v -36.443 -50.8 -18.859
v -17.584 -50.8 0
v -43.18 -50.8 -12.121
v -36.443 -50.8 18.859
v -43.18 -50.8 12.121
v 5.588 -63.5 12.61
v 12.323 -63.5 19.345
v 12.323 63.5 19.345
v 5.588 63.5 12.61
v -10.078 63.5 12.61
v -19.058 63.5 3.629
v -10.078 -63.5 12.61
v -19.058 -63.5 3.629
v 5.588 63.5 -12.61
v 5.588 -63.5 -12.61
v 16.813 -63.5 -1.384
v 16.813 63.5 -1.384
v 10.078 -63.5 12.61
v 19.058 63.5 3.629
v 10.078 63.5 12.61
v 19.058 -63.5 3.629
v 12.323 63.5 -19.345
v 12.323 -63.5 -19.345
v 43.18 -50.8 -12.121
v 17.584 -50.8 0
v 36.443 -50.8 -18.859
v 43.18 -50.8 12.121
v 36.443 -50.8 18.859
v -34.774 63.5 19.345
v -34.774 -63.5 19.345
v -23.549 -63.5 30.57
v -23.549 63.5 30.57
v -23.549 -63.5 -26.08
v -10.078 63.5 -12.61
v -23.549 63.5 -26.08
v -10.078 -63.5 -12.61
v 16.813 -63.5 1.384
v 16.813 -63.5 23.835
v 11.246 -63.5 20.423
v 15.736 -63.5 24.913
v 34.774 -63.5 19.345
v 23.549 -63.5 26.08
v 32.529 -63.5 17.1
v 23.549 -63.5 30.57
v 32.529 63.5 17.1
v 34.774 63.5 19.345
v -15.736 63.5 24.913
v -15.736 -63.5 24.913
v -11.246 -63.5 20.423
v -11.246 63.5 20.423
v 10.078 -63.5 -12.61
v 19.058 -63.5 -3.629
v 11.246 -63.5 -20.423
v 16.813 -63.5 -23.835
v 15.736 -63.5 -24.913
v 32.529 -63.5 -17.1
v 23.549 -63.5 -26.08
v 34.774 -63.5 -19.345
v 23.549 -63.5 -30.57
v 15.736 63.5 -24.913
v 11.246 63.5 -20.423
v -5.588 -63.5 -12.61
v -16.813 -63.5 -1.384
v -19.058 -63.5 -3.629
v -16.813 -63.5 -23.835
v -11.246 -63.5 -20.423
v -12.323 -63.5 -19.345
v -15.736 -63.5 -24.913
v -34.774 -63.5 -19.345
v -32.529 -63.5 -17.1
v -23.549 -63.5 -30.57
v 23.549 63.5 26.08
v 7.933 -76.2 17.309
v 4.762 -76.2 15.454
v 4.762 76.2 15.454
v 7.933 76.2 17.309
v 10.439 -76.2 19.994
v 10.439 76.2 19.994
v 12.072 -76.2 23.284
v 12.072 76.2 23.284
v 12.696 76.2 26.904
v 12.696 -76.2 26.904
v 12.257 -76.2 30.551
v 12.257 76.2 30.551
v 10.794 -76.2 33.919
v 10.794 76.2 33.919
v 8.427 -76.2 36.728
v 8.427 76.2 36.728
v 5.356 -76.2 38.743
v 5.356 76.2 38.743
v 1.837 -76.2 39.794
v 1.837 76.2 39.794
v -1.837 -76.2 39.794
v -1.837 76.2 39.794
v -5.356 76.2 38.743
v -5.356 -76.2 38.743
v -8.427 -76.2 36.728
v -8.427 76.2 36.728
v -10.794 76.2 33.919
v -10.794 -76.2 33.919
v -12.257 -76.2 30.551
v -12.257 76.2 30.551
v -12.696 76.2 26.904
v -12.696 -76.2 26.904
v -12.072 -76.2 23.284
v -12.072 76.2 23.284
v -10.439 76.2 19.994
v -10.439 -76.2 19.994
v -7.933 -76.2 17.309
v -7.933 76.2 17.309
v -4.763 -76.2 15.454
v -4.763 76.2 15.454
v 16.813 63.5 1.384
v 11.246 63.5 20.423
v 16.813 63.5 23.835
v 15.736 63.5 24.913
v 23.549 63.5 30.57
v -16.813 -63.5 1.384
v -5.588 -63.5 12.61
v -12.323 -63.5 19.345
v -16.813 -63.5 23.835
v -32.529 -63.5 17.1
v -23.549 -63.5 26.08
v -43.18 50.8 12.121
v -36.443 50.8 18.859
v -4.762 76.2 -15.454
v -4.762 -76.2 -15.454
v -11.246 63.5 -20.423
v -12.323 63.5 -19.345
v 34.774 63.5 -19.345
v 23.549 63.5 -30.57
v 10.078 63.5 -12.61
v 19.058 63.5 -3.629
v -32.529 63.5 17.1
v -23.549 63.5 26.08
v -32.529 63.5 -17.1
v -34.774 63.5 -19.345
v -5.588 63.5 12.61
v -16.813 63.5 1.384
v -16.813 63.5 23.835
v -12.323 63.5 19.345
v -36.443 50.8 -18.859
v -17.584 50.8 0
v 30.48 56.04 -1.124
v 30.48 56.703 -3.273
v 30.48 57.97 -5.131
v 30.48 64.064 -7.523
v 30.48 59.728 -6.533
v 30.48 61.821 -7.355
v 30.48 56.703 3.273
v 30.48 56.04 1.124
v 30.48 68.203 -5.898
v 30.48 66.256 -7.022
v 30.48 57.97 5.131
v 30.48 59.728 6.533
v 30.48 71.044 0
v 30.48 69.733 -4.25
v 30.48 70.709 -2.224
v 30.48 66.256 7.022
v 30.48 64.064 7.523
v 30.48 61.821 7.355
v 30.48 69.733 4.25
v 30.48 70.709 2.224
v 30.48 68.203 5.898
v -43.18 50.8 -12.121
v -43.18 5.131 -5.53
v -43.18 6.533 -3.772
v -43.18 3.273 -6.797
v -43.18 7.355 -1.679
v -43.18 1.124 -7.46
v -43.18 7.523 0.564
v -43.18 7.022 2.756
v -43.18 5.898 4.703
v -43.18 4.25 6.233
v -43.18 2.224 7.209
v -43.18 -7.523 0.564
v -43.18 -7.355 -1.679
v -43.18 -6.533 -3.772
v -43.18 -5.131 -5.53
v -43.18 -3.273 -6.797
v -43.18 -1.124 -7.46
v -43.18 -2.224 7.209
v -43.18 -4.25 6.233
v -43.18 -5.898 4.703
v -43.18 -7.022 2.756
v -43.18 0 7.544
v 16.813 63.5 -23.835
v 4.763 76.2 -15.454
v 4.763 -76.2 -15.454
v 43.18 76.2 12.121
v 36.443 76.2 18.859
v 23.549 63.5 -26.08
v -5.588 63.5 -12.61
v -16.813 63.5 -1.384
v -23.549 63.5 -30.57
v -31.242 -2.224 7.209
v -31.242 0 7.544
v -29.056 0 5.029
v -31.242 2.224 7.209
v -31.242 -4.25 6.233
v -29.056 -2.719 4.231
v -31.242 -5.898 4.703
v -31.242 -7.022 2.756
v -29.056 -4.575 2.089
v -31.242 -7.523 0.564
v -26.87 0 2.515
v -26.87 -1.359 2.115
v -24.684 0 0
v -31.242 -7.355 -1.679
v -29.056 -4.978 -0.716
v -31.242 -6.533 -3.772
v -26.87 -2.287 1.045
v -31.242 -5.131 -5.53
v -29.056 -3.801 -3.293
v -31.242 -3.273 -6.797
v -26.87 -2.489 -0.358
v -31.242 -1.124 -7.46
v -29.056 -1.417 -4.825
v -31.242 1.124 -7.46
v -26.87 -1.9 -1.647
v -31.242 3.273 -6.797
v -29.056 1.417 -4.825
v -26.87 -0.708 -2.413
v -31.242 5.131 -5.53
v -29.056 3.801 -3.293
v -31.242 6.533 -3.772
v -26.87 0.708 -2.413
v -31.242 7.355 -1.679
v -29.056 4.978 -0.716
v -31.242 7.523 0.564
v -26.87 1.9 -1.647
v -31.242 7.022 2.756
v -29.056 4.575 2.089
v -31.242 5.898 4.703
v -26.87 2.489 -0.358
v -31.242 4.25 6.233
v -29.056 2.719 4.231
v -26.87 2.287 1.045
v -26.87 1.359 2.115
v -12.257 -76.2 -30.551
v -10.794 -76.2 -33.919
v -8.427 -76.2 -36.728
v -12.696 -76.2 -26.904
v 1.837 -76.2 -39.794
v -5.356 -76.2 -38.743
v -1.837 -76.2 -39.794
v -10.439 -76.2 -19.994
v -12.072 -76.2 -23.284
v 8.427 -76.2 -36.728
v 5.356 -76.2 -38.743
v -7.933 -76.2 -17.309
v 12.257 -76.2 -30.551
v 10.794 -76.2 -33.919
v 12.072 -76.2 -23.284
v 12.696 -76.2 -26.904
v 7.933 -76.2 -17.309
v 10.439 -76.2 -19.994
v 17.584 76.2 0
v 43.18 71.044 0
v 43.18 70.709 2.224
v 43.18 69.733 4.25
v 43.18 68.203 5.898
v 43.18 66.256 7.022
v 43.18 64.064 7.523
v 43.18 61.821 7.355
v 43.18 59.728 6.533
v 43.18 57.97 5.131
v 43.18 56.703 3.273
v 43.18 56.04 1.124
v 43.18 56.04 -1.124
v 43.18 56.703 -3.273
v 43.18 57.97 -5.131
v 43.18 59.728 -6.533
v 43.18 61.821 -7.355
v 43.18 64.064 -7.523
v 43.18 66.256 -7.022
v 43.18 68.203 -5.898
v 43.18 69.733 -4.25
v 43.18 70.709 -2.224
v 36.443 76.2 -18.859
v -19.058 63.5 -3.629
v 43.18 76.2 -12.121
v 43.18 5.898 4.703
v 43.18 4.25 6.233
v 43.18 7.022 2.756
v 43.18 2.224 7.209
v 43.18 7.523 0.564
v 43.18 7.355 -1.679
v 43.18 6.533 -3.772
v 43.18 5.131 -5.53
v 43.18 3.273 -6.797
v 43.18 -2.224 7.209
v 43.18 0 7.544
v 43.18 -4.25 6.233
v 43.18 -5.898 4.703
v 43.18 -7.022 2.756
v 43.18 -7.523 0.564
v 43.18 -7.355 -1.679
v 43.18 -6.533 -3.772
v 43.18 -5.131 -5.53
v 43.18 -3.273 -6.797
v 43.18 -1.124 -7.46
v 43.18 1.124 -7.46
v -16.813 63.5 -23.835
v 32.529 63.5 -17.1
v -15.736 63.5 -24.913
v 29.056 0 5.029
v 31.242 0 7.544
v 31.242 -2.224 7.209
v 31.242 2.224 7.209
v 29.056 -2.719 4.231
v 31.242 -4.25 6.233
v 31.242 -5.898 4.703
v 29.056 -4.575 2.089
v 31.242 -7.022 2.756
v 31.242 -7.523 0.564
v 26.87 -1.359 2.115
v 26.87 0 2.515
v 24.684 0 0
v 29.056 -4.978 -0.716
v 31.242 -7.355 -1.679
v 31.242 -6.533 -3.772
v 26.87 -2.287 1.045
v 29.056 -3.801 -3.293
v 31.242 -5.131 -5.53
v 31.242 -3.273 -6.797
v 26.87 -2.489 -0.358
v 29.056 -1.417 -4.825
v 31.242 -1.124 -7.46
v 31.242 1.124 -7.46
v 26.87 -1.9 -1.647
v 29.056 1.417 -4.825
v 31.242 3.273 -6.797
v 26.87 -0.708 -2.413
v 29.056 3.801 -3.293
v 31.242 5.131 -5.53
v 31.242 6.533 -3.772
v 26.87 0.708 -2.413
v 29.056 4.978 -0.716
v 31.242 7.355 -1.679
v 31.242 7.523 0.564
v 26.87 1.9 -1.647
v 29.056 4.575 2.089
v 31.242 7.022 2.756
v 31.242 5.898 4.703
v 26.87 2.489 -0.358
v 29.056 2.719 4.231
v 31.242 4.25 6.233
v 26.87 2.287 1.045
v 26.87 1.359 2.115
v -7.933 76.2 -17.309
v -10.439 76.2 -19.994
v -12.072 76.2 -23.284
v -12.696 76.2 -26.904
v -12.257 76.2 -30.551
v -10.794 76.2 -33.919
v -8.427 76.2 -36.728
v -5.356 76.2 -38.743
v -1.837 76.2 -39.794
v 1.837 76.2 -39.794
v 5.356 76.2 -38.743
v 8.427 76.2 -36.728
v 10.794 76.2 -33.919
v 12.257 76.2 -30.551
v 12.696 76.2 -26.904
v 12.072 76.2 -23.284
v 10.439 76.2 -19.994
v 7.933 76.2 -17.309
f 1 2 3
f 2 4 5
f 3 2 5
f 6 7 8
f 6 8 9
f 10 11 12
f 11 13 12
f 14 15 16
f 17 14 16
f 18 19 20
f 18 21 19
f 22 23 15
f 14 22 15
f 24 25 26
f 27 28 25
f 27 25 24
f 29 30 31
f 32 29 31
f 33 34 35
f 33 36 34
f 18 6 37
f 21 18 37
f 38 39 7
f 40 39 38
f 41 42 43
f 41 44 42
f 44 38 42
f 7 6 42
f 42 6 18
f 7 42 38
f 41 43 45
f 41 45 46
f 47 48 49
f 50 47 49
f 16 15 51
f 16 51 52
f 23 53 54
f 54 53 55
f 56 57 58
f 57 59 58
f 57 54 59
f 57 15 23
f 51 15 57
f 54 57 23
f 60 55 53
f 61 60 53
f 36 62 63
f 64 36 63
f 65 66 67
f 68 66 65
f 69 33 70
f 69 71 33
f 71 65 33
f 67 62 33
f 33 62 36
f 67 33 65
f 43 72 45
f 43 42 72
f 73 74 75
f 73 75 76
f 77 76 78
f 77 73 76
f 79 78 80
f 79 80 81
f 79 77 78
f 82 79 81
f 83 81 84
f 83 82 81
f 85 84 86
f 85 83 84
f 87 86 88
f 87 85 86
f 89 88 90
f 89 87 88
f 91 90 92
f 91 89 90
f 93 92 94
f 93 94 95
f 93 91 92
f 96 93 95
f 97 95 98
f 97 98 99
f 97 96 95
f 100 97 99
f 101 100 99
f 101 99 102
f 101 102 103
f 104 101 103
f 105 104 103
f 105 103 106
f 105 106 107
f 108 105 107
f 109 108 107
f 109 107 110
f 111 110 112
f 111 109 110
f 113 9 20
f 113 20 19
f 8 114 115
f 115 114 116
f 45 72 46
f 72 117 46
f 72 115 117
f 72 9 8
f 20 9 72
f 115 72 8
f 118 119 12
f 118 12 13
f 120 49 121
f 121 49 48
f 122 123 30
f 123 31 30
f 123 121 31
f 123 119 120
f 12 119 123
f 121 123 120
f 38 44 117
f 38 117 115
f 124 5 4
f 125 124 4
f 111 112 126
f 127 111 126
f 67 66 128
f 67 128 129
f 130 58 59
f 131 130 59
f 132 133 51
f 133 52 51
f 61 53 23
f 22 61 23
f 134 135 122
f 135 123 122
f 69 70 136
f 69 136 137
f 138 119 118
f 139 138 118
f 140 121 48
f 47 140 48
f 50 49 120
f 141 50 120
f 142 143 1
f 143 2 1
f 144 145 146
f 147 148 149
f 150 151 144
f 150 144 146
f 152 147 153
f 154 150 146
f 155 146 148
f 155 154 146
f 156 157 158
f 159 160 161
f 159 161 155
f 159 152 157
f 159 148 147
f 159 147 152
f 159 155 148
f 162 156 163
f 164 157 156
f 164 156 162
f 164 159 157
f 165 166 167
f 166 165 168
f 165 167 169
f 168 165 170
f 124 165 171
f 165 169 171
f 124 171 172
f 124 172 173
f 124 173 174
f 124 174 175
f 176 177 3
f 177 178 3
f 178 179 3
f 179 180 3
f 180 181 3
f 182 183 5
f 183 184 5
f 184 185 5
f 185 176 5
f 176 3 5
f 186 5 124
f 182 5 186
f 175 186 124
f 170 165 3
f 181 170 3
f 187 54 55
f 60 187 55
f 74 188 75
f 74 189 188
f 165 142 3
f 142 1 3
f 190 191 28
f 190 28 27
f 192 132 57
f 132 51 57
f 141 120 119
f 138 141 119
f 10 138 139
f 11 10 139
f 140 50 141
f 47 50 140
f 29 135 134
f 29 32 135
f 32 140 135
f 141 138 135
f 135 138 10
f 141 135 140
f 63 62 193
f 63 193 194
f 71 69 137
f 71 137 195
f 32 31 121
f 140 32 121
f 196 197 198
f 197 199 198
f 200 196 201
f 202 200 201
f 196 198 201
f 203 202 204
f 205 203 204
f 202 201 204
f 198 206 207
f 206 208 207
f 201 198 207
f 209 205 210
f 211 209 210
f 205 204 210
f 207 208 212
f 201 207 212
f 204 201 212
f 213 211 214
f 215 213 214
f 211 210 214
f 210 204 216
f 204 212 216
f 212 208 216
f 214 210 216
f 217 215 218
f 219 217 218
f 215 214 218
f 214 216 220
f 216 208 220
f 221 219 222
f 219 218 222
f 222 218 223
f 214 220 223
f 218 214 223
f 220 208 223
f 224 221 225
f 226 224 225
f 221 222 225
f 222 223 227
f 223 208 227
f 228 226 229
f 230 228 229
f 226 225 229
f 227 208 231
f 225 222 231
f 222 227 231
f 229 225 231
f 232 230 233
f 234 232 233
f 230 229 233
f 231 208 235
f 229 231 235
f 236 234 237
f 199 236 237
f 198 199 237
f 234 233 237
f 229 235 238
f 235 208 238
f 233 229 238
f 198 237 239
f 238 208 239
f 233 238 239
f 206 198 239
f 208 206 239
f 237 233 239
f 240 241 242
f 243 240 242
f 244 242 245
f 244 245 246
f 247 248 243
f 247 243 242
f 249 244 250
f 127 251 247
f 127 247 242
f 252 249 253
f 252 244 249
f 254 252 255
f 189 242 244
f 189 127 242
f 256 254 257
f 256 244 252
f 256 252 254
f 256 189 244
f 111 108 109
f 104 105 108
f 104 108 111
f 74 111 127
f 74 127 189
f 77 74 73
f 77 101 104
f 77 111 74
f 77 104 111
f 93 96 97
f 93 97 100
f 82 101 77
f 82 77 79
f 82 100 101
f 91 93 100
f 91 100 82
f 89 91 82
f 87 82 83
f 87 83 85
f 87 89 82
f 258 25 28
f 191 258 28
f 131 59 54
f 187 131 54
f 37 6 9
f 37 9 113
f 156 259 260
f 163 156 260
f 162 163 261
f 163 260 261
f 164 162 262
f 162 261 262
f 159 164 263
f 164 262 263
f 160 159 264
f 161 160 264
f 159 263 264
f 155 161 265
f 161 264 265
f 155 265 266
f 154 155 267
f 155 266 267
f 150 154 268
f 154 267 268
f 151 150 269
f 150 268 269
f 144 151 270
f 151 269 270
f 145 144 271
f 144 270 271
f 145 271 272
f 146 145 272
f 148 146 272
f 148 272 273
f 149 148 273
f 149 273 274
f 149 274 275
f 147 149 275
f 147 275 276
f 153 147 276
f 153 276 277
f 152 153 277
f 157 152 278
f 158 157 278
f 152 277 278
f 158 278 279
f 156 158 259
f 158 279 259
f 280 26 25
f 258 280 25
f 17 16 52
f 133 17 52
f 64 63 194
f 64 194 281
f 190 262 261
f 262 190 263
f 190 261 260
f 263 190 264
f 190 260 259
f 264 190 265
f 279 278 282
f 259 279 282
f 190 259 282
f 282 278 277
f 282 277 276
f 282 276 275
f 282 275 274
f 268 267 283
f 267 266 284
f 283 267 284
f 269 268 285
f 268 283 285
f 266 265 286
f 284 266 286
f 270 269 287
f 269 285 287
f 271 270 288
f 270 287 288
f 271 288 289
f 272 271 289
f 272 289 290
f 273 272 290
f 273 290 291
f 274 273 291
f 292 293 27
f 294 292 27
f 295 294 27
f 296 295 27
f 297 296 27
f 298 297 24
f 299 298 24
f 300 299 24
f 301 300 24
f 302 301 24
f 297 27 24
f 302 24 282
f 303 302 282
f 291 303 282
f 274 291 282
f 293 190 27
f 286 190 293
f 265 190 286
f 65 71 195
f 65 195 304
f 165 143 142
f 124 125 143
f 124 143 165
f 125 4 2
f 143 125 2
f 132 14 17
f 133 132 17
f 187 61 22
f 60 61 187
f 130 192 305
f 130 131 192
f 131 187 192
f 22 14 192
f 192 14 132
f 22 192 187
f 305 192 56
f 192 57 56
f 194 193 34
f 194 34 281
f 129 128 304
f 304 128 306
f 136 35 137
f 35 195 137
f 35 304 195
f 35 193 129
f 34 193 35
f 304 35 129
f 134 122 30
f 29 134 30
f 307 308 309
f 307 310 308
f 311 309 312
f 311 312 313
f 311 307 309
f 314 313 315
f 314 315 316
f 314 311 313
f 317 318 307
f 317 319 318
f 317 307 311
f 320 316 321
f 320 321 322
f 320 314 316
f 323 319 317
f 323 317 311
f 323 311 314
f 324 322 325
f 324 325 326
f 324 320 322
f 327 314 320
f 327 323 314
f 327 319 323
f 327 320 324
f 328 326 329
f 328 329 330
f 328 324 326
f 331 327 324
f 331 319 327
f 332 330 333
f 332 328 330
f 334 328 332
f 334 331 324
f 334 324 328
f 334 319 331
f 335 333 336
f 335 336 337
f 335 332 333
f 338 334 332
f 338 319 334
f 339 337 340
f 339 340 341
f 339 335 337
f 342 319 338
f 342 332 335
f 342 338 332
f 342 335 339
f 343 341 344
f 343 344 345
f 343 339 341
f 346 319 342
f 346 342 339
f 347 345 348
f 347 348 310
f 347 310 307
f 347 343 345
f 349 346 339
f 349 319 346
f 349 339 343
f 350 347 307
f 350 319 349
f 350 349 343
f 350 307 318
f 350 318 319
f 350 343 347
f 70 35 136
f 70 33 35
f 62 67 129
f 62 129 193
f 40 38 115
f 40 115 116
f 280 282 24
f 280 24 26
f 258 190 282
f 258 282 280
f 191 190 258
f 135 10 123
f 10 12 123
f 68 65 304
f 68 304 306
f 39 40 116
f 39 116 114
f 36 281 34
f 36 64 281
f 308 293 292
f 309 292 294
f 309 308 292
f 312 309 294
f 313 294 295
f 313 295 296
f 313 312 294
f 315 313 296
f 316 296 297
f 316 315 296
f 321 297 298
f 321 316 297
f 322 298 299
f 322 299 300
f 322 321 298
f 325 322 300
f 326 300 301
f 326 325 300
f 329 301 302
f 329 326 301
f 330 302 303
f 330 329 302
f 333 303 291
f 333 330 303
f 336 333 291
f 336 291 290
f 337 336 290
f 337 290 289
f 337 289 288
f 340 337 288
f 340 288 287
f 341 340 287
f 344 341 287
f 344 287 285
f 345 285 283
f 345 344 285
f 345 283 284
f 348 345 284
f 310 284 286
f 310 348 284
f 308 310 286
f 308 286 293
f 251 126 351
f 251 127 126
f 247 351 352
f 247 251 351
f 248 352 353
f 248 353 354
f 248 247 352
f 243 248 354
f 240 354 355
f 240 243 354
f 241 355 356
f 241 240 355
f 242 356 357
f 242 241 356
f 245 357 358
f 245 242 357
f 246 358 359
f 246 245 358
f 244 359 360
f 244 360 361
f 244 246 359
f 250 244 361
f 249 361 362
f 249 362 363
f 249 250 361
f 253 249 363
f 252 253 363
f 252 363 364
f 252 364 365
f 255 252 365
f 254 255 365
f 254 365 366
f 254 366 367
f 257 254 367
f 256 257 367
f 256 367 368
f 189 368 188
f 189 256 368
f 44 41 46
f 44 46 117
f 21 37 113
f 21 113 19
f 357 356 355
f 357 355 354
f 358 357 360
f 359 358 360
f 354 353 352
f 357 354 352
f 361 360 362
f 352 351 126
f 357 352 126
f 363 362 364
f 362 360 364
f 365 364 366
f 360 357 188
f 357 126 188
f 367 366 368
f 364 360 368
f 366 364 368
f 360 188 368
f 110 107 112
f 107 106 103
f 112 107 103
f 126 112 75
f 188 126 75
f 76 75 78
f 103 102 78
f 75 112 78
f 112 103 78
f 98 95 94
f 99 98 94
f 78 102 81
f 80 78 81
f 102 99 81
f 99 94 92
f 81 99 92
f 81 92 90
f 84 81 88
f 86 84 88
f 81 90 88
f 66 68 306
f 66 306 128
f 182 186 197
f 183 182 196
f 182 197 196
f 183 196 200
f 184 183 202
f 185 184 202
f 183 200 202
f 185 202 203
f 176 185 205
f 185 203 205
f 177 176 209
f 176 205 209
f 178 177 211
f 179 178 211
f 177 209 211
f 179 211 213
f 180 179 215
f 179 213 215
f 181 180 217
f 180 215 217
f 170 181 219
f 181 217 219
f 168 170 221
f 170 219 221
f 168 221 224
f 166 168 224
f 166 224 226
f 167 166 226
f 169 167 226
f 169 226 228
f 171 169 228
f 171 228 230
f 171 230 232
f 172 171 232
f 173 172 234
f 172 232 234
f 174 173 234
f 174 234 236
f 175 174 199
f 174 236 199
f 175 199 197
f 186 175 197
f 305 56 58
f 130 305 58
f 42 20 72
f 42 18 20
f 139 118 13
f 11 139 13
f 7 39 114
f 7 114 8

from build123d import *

# Parameters (mm, degrees)
F1_DEPTH  = 63.5
F5_DEPTH  = 76.2
F8_DEPTH  = 50.8
F13_DEPTH = 25.4
F14_R     = 7.5438
F15_DEPTH = 12.7


with BuildPart() as f1:
    # F0 (on Front) → F1 (new body, symmetric)
    with BuildSketch(Plane.XZ):
        Polygon((23.5485122421, 26.0801280605), (32.5287683632, 17.0998719395), (34.7738323935, 19.3449359697), (23.5485122421, 30.5702561211), (16.8133201513, 23.8350640303), (15.7356894168, 24.9126947648), (11.2455613563, 20.4225667043), (12.3231920908, 19.3449359697), (5.588, 12.6097438789), (16.8133201513, 1.3844237276), (19.0583841816, 3.6294877579), (10.0781280605, 12.6097438789), align=None)
    extrude(amount=F1_DEPTH, both=True)


with BuildPart() as f2_1:
    # F2: instance of F1
    add(f1.part.mirror(Plane.YZ))


with BuildPart() as f3_1:
    # F3: instance of F1
    add(f1.part.mirror(Plane.XY))


with BuildPart() as f3_2:
    # F3: instance of F2_1
    add(f2_1.part.mirror(Plane.XY))


with BuildPart() as f5:
    # F4 (on Front) → F5 (new body, symmetric)
    with BuildSketch(Plane.XZ):
        with BuildLine():
            Line((4.7625, -15.4541050531), (4.7625, 15.4541050531))
            ThreePointArc((4.7625, 15.4541050531), (0, 39.9273201513), (-4.7625, 15.4541050531))
            Line((-4.7625, 15.4541050531), (-4.7625, -15.4541050531))
            ThreePointArc((-4.7625, -15.4541050531), (0, -39.9273201513), (4.7625, -15.4541050531))
        make_face()
    extrude(amount=F5_DEPTH, both=True)


with BuildPart() as f8:
    # F7 (on Front) → F8 (new body, symmetric)
    with BuildSketch(Plane.XZ):
        Polygon((43.18, -12.1212336013), (43.18, 12.1212336013), (36.442695747, 18.8585378542), (17.5841578928, 0), (36.442695747, -18.8585378542), align=None)
    extrude(amount=F8_DEPTH, both=True)

    # F9 (on Front) → F10 (revolve, cut)
    with BuildSketch(Plane.XZ):
        Polygon((24.6842747073, 0), (43.18, 0), (43.18, 7.5438), (31.242, 7.5438), align=None)
    revolve(axis=Axis((33.9321373536, 0, 0), (1, 0, 0)), mode=Mode.SUBTRACT)


with BuildPart() as f11_1:
    # F11: instance of F8
    add(f8.part.mirror(Plane.YZ))


with BuildPart() as f8_1:
    add(f8.part)

    # F12 (on face) → F13 (join)
    with BuildSketch(Plane(origin=(0, 50.8, 0), x_dir=(-1, 0, 0), z_dir=(0, 1, 0))):
        Polygon((-36.442695747, 18.8585378542), (-43.18, 12.1212336013), (-43.18, -12.1212336013), (-36.442695747, -18.8585378542), (-17.5841578928, 0), align=None)
    extrude(amount=F13_DEPTH)

    # F14 (on face) → F15 (cut)
    with BuildSketch(Plane.YZ.offset(43.18)):
        with Locations((63.5, 0)):
            Circle(F14_R)
    extrude(amount=-F15_DEPTH, mode=Mode.SUBTRACT)


solid = Compound([f1.part, f2_1.part, f3_1.part, f3_2.part, f5.part, f11_1.part, f8_1.part])
